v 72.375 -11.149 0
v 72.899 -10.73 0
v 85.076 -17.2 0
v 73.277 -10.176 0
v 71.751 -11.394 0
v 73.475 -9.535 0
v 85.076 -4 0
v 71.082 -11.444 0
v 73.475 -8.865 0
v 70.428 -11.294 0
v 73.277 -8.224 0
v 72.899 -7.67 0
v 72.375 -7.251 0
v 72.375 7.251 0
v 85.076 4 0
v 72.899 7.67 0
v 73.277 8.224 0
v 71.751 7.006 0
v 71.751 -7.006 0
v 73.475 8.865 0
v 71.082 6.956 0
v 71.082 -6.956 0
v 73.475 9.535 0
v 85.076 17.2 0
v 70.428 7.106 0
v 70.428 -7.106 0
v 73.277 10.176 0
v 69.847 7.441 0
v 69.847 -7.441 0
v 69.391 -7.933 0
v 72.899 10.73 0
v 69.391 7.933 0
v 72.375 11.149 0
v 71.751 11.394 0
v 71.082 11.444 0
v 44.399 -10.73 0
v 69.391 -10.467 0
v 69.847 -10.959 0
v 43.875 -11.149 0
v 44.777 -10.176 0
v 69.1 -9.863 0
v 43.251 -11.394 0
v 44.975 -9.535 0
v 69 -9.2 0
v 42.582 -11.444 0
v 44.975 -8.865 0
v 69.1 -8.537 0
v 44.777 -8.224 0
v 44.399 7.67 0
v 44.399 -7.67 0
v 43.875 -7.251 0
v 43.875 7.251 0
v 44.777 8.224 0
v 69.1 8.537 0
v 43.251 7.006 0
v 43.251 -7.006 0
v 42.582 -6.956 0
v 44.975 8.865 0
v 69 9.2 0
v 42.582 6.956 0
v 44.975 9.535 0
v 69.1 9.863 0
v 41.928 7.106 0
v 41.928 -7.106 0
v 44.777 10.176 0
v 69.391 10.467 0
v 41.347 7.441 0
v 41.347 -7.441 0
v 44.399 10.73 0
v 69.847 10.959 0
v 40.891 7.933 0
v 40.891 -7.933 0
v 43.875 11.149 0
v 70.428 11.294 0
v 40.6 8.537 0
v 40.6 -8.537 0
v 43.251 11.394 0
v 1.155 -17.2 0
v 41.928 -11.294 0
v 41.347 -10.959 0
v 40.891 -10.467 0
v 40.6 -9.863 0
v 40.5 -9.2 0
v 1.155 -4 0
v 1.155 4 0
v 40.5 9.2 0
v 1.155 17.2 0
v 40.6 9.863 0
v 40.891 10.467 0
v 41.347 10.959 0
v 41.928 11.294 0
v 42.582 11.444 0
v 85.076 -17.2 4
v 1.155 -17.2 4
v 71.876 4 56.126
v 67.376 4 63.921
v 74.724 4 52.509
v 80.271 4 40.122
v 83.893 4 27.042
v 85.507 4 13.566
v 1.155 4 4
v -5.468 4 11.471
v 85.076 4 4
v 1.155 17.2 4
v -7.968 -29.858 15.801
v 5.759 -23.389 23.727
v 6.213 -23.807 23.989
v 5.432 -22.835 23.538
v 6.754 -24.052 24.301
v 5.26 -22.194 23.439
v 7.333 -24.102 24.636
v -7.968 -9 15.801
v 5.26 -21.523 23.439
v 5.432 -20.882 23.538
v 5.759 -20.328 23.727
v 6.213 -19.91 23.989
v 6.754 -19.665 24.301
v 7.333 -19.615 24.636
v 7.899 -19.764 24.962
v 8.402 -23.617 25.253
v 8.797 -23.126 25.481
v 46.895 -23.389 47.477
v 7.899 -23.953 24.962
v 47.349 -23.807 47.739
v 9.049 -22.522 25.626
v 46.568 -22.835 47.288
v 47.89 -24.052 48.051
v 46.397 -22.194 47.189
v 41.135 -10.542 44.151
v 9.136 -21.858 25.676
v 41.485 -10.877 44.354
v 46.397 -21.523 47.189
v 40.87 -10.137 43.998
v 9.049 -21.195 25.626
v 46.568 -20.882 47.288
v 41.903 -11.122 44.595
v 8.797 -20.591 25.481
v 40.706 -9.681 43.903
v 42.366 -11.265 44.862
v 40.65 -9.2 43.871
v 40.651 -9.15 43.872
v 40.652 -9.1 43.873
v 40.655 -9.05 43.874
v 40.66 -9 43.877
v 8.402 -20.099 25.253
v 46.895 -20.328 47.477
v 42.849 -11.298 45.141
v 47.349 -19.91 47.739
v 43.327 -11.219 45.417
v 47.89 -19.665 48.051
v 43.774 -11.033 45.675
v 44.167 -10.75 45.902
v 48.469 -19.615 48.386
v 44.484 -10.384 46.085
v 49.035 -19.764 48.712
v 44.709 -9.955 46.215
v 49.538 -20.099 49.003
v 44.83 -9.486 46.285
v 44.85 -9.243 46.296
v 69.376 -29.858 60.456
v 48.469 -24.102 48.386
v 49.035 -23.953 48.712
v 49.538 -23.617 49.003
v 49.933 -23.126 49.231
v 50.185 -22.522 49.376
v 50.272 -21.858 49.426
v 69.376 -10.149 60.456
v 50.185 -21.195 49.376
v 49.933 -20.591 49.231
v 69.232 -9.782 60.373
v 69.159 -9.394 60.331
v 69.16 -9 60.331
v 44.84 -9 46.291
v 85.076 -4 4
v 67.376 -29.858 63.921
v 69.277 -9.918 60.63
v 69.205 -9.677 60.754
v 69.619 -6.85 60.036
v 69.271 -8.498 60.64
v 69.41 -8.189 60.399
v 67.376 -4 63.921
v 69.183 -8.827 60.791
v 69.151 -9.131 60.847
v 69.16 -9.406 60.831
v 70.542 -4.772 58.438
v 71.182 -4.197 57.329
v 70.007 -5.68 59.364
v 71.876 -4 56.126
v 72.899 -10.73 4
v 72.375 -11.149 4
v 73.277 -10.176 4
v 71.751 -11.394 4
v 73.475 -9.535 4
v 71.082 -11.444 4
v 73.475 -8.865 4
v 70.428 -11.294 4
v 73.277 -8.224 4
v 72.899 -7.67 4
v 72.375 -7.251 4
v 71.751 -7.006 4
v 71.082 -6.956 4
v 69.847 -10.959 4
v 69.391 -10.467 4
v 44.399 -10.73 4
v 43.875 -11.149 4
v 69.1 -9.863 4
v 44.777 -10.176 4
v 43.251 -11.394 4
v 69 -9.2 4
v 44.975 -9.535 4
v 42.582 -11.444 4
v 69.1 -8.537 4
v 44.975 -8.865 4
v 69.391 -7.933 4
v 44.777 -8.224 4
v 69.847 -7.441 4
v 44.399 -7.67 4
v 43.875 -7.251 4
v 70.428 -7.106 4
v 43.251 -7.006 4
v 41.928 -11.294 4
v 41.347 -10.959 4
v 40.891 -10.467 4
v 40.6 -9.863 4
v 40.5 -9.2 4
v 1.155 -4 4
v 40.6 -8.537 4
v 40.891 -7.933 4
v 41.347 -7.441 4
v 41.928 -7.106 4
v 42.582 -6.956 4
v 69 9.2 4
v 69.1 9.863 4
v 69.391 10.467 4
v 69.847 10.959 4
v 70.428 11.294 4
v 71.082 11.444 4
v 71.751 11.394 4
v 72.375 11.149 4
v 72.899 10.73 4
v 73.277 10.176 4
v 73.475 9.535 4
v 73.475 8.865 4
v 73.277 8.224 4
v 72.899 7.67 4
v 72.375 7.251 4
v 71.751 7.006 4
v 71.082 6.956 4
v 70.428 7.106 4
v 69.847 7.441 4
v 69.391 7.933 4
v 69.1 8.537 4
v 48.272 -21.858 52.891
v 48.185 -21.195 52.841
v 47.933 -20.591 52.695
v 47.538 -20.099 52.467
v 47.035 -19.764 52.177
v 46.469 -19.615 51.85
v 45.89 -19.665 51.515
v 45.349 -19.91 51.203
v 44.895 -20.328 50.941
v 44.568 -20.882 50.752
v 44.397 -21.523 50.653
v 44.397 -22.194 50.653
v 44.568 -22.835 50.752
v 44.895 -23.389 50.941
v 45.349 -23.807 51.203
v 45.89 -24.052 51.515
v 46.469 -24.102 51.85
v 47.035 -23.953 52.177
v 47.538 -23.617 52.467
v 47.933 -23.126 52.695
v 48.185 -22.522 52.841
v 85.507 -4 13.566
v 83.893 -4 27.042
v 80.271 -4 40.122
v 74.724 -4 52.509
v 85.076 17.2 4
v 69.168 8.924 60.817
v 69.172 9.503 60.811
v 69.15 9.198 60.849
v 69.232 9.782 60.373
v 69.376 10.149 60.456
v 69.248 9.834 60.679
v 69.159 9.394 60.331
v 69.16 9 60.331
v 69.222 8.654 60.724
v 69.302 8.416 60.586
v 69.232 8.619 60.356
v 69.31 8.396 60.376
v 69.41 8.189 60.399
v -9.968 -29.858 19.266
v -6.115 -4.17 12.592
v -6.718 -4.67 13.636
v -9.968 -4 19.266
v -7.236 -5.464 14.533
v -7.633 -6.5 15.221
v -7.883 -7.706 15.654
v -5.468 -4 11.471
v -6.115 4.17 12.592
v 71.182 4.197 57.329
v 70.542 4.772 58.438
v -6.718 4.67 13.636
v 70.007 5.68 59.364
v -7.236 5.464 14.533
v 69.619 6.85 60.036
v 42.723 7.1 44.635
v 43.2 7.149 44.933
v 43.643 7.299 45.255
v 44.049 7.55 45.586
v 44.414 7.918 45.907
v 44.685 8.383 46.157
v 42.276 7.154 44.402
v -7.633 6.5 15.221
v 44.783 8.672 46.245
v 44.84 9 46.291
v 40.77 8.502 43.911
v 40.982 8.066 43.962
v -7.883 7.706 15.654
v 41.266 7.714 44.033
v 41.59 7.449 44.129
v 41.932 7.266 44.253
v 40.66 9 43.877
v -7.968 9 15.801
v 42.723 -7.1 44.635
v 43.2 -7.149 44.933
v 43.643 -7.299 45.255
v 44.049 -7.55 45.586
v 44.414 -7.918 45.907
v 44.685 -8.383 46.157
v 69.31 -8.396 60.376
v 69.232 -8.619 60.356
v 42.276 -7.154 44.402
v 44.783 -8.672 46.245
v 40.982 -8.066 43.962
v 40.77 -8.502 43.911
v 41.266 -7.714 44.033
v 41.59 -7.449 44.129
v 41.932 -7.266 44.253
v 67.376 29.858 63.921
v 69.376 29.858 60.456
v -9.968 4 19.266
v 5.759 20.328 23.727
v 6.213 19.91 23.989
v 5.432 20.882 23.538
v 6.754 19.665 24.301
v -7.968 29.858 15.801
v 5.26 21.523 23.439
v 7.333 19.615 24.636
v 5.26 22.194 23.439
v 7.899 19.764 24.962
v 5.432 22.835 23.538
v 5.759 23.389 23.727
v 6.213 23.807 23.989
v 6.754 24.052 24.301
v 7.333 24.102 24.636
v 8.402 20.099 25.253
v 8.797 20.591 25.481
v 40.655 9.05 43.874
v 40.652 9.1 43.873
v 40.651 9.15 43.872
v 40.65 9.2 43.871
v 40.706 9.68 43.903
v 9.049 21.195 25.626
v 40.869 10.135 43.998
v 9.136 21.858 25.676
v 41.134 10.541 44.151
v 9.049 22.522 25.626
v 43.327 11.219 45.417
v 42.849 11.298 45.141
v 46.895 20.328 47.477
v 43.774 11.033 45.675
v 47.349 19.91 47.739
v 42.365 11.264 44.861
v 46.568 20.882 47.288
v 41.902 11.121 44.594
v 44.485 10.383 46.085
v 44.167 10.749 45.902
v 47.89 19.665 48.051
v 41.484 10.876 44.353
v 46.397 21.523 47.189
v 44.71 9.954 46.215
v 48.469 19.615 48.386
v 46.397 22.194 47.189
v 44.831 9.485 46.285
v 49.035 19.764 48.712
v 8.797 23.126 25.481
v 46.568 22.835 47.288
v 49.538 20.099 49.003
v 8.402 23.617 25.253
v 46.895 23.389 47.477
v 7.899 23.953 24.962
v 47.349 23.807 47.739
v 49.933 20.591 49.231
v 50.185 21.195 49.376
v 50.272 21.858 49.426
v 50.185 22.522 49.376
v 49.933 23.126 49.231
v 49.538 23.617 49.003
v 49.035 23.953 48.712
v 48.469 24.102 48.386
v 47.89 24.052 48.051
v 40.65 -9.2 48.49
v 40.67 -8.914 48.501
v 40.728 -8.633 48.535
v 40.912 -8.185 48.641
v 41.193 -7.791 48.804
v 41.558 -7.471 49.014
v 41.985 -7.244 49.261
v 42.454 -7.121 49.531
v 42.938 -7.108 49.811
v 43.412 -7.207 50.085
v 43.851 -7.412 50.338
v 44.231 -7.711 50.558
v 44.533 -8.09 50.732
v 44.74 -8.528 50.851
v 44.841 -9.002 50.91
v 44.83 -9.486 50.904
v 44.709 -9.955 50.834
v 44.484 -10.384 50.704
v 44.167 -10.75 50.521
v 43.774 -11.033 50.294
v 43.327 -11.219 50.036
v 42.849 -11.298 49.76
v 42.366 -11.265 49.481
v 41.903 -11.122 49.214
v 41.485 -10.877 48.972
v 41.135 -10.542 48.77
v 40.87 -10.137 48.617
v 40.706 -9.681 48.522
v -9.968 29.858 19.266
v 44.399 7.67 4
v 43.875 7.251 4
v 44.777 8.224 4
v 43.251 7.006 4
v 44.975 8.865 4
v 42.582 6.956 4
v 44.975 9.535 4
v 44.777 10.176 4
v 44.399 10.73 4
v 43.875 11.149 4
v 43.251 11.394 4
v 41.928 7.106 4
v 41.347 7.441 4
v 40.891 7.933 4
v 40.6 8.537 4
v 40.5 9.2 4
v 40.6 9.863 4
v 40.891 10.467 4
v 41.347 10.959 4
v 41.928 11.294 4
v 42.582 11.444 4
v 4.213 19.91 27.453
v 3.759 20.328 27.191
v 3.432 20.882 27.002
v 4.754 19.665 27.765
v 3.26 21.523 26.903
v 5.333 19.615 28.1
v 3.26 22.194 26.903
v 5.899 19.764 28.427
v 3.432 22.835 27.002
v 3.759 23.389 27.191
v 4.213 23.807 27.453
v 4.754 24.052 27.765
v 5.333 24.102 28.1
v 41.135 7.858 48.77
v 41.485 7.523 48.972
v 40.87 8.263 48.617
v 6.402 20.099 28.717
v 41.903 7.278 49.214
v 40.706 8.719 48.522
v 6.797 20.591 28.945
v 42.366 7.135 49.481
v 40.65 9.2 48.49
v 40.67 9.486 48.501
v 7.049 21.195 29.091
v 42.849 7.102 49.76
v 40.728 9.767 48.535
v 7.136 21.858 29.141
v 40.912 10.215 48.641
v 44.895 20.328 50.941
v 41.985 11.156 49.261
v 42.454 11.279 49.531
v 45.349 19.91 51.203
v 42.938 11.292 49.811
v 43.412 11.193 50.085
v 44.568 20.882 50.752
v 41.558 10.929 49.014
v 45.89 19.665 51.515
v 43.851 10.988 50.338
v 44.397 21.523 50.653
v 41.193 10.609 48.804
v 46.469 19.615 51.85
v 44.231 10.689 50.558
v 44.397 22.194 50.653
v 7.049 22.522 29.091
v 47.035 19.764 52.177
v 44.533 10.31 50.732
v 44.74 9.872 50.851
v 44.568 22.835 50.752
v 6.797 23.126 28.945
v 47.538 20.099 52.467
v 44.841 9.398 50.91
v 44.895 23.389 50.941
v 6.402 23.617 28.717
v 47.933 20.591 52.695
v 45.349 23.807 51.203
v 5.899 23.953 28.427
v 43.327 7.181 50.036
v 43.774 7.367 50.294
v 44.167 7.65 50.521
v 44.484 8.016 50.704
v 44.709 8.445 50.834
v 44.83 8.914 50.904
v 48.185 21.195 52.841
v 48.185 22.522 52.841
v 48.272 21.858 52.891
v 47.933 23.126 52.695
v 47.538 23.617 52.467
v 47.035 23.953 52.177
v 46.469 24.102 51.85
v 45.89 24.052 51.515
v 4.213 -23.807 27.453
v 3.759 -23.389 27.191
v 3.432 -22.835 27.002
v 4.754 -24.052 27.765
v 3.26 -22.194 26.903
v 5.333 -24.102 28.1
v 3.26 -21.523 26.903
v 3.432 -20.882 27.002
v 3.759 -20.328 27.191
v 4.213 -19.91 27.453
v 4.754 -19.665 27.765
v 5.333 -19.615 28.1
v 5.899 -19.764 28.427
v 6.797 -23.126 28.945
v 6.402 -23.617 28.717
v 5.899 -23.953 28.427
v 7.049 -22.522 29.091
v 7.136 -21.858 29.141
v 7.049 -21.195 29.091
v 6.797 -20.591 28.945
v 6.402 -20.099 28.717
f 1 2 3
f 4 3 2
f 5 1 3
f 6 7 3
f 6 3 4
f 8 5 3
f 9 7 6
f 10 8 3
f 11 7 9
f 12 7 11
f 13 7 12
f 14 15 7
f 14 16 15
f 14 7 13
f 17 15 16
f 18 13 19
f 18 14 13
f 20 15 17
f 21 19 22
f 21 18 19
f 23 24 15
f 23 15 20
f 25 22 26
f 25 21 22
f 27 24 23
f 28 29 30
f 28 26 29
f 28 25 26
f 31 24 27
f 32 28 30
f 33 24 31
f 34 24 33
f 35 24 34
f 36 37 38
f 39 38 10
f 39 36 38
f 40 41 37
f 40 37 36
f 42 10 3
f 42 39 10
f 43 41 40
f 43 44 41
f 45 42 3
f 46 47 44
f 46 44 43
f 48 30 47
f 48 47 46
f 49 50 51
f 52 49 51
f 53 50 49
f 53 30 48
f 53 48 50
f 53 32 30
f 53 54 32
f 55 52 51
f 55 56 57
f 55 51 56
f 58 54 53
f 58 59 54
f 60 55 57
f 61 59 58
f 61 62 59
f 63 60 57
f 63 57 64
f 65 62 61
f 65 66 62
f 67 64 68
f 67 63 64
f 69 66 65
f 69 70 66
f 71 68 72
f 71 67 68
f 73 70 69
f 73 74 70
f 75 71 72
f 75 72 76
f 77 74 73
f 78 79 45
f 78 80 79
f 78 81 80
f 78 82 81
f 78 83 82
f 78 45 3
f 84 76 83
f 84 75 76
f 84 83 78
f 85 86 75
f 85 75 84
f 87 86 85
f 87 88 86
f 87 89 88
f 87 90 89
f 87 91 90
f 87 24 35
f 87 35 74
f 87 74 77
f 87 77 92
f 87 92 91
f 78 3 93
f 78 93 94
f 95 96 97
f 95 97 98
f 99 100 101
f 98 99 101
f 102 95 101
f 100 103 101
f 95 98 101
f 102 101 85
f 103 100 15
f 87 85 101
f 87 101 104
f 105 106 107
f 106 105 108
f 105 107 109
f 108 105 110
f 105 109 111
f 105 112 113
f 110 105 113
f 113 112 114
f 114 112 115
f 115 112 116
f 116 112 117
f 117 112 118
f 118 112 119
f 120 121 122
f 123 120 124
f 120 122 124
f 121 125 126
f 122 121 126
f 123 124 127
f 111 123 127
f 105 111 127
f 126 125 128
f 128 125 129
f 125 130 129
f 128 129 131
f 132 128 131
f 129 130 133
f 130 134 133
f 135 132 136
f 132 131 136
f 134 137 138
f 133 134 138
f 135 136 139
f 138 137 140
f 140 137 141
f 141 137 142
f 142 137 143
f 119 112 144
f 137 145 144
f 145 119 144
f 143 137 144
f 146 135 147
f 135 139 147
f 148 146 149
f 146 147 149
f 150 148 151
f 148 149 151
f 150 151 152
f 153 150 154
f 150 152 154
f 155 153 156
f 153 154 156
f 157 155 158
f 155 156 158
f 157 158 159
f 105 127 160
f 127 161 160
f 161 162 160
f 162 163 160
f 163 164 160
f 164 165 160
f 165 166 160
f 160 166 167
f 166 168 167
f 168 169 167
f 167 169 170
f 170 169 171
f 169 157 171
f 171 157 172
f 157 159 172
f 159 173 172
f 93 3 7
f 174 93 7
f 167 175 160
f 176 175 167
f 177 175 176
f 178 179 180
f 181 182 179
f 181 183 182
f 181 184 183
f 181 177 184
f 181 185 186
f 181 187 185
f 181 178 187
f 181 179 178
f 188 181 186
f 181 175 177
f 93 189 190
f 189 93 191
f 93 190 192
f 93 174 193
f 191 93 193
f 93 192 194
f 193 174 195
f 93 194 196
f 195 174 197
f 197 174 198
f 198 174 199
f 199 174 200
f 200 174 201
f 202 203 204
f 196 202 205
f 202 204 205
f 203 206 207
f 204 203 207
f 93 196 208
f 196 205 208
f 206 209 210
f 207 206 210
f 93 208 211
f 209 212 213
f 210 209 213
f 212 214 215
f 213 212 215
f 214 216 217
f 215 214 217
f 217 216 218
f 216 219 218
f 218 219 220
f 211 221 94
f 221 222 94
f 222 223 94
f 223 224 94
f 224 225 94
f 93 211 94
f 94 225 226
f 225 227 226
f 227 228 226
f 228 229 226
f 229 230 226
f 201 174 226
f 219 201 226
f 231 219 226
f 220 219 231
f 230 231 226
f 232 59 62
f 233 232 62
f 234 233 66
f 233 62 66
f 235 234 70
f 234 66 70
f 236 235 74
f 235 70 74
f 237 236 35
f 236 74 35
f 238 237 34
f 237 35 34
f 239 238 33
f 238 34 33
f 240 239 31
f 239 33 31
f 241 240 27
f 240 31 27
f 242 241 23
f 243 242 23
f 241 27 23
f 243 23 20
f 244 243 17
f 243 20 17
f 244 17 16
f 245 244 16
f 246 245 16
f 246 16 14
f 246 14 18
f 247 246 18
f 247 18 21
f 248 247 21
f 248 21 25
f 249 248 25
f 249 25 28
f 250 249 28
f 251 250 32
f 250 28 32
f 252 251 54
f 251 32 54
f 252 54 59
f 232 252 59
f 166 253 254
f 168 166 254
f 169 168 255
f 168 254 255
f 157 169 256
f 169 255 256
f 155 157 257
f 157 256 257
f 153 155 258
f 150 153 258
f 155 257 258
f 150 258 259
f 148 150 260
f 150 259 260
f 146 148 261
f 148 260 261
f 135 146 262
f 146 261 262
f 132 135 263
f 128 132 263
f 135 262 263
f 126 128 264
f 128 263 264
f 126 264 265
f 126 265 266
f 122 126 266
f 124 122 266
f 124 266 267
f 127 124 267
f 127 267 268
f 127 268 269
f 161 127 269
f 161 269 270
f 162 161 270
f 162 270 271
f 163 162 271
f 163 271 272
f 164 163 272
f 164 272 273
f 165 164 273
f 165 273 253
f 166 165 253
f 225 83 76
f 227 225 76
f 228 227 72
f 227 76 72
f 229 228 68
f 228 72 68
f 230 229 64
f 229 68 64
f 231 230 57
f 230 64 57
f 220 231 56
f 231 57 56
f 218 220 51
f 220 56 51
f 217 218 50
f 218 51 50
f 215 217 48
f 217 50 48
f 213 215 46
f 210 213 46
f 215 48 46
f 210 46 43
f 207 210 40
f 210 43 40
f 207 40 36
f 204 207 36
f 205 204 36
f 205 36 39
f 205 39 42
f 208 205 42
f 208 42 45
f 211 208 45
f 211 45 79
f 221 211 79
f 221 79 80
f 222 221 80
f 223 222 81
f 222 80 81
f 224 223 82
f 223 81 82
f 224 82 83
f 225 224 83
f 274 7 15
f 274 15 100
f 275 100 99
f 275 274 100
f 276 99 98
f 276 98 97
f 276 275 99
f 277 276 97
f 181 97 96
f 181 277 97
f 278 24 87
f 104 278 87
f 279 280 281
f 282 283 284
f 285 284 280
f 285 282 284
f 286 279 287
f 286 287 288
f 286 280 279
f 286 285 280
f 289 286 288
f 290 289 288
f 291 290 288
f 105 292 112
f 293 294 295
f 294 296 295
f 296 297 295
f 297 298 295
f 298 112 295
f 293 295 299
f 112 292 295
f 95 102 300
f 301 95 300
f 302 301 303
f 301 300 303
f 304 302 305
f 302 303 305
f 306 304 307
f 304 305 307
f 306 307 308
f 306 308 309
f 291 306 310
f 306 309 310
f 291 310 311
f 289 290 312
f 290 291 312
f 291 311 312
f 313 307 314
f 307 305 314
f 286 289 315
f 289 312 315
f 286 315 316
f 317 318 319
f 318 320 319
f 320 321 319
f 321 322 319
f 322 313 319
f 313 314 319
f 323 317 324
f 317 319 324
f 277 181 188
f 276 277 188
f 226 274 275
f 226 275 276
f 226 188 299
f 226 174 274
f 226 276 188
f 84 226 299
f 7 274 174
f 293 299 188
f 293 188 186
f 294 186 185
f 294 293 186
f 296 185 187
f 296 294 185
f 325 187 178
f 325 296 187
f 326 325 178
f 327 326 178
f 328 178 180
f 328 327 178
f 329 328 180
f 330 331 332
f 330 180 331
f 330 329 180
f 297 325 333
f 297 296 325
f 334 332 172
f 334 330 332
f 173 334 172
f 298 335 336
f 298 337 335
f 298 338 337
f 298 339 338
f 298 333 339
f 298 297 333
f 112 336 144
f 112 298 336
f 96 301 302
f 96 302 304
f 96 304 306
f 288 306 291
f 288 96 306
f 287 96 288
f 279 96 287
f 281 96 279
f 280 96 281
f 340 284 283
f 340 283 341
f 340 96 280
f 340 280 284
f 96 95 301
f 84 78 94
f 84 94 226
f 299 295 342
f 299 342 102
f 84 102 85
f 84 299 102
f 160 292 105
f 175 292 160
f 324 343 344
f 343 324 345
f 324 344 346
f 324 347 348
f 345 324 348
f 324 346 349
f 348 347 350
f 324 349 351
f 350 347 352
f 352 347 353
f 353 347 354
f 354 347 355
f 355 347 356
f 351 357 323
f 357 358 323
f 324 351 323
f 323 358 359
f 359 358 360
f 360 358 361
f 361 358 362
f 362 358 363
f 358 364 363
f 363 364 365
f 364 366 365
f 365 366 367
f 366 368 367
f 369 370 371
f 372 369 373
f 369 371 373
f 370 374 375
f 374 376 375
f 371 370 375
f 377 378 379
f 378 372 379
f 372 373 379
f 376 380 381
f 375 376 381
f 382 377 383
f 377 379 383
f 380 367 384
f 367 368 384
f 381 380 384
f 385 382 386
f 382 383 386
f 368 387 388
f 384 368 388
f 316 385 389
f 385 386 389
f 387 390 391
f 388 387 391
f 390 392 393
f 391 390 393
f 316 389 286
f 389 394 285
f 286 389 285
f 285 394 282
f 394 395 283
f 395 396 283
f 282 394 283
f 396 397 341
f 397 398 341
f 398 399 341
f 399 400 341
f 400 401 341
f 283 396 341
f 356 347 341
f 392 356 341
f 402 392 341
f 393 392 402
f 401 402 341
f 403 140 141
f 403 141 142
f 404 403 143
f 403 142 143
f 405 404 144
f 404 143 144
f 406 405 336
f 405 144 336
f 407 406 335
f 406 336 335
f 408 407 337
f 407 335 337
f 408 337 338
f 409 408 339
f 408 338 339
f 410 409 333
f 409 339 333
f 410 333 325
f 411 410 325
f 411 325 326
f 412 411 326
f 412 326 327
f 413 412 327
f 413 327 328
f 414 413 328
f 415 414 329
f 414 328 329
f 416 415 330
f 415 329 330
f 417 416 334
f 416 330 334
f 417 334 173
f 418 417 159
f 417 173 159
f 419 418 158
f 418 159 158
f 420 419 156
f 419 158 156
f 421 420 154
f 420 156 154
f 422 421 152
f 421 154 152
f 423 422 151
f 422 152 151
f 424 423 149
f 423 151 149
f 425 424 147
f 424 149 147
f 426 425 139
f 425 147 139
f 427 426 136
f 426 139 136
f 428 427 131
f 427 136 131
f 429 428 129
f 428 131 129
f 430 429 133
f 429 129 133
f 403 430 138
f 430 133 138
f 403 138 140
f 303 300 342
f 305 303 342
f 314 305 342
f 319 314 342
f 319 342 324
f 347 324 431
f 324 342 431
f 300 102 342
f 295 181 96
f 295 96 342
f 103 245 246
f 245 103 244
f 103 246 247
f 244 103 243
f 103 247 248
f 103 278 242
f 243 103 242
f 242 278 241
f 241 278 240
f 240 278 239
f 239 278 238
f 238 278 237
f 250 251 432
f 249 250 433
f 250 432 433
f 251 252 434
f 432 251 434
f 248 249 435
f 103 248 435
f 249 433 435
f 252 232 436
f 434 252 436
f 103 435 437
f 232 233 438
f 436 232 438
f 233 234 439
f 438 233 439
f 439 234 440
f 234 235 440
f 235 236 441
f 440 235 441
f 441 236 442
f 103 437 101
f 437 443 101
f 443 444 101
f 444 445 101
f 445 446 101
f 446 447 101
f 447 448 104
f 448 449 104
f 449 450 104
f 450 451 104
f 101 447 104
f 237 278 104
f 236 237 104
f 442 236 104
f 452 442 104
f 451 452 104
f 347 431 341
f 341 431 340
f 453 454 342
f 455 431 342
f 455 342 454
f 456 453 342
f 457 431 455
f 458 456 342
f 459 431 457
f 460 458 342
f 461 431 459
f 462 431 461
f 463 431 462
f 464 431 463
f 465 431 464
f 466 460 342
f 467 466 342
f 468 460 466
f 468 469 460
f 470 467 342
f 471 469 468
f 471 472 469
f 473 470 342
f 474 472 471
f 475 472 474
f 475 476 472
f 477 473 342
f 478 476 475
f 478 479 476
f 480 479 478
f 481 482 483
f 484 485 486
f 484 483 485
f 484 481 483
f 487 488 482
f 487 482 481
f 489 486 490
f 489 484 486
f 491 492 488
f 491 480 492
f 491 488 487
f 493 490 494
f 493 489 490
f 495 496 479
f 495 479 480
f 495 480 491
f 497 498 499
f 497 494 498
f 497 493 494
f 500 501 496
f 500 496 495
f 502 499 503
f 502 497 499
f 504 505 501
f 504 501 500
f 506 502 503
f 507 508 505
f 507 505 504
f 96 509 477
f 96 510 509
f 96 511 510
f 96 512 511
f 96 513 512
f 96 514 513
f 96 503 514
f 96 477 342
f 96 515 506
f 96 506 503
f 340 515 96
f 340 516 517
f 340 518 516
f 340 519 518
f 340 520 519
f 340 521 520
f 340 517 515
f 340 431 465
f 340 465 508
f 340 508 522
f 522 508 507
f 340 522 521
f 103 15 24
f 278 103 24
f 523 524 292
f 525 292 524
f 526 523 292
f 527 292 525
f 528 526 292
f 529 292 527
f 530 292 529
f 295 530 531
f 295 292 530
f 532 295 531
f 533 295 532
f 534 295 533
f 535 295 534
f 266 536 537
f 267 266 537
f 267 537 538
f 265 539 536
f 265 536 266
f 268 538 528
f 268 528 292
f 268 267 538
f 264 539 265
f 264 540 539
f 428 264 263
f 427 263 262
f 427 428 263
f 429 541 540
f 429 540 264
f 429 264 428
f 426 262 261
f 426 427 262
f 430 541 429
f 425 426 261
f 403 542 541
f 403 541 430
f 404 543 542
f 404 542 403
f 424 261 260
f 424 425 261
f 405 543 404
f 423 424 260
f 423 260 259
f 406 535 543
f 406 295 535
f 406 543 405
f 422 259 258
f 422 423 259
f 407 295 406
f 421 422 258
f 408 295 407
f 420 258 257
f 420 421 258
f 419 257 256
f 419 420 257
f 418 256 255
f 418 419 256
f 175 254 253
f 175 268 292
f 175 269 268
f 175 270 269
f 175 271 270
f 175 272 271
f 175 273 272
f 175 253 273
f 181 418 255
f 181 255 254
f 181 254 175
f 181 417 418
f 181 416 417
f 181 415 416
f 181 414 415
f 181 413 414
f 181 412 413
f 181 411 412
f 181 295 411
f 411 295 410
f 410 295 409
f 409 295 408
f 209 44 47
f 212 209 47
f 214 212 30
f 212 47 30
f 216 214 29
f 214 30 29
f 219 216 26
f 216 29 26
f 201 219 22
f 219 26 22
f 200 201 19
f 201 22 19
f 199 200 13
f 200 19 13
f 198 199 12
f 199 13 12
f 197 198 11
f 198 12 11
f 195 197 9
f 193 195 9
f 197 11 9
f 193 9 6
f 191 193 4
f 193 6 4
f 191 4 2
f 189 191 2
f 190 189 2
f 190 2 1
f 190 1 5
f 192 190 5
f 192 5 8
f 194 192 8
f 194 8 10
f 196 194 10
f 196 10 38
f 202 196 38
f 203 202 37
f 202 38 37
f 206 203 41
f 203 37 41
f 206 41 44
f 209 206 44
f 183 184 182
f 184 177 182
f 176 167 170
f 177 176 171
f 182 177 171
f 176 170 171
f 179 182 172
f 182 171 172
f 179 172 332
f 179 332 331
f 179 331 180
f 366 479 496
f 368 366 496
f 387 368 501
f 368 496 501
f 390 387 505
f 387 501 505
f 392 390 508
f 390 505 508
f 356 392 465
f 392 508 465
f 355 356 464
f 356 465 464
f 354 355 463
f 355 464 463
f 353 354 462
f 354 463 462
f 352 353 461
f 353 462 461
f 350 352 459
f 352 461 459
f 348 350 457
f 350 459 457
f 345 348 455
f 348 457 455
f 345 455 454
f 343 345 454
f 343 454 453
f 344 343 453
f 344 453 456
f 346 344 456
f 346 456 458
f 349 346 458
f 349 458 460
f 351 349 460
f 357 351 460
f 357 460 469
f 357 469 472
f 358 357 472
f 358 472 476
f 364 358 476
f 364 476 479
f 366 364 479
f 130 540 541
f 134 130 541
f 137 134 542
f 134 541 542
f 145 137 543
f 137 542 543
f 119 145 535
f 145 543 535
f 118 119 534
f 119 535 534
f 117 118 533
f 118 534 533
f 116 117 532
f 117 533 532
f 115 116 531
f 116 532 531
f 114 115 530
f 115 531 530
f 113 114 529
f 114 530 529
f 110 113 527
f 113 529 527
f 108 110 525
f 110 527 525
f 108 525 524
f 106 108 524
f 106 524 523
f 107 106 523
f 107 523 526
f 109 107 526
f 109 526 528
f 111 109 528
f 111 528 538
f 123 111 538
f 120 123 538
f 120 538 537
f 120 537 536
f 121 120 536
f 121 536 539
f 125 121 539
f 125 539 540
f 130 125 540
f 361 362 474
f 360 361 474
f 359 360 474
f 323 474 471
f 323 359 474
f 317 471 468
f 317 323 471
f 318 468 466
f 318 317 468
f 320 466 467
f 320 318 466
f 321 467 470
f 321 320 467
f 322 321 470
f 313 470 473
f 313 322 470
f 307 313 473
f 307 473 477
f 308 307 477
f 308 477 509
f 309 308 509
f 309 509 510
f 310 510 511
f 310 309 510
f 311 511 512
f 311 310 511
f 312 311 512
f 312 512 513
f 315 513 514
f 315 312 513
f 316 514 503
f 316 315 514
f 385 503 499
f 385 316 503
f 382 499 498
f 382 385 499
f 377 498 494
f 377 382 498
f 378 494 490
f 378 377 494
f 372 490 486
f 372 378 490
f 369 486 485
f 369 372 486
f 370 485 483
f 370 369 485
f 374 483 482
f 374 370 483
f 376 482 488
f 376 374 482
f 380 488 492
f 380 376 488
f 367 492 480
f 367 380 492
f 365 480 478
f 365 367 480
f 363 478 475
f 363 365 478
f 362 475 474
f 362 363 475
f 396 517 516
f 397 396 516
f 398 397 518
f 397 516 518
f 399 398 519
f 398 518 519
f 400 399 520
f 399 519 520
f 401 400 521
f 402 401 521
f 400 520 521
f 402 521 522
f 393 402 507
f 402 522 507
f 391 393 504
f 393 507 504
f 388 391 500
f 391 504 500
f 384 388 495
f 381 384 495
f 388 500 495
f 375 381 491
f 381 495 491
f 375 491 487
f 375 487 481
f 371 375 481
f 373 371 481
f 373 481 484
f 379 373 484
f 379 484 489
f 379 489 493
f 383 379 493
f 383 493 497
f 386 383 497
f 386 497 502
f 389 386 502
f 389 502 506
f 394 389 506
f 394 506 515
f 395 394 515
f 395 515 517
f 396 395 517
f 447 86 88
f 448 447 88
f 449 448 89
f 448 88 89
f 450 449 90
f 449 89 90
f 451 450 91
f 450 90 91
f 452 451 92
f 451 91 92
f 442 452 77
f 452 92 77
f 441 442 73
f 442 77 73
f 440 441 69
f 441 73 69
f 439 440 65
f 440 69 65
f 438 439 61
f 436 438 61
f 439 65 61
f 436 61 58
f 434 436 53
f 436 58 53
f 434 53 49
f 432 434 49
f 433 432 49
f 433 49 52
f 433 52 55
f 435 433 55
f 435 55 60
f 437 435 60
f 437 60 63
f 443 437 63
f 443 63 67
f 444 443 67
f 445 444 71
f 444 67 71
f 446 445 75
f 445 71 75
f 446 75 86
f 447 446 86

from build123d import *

# Parameters (mm, degrees)
BOSS_EXTRUDE1_DEPTH      = 4
BOSS_EXTRUDE1_DEPTH_BACK = 4
SKETCH3_W                = 89.310018428
SKETCH3_H                = 59.716622104
BOSS_EXTRUDE2_DEPTH      = 4
CUT_EXTRUDE1_REACH       = 112.584
SKETCH4_R                = 2.25
SKETCH5_W                = 83.9215243
SKETCH5_H                = 34.4
BOSS_EXTRUDE3_DEPTH      = 4
SKETCH6_R                = 2.25
CUT_EXTRUDE2_DEPTH       = 4
FILLET1_R                = 5
SKETCH7_R                = 2.1
CUT_EXTRUDE3_DEPTH       = 109.665502377


with BuildPart() as part:
    # Sketch2 → Boss-Extrude1 (new, two sides: drawn at the far end of the back side and taken through both)
    with BuildSketch(Plane(origin=(0, 0, 0), x_dir=(1, 0, 0), z_dir=(0, 1, 0)).offset(-BOSS_EXTRUDE1_DEPTH_BACK)):
        with BuildLine():
            Line((1.154700538, 0), (85.076224838, 0))
            ThreePointArc((85.076224838, 0), (82.329376533, -33.6502282), (67.376468713, -63.920569811))
            Line((67.376468713, -63.920569811), (-9.968276059, -19.265560597))
            Line((-9.968276059, -19.265560597), (1.154700538, 0))
        make_face()
    extrude(amount=BOSS_EXTRUDE1_DEPTH + BOSS_EXTRUDE1_DEPTH_BACK)

    # Sketch3 → Boss-Extrude2 (add)
    with BuildSketch(Plane(origin=(-10.834301462, 0, 18.765560597), x_dir=(0.8660254037844386, 0, 0.5000000000000001), z_dir=(-0.5000000000000001, 0, 0.8660254037844386))):
        with Locations((45.655009214, 0)):
            Rectangle(SKETCH3_W, SKETCH3_H)
    extrude(amount=-BOSS_EXTRUDE2_DEPTH)

    # Sketch4 → Cut-Extrude1 (cut, up to next)
    with BuildSketch(Plane(origin=(-10.834301462, 0, 18.765560597), x_dir=(0.8660254037844386, 0, 0.5000000000000001), z_dir=(-0.5000000000000001, 0, 0.8660254037844386)), mode=Mode.PRIVATE) as cut_extrude1_sk1:
        with Locations((66, 21.858311052)):
            Circle(SKETCH4_R)
    cut_extrude1_tool1 = extrude(cut_extrude1_sk1.sketch, amount=-CUT_EXTRUDE1_REACH, mode=Mode.PRIVATE) & part.part
    # Sketch4 → Cut-Extrude1 (cut, up to next)
    with BuildSketch(Plane(origin=(-10.834301462, 0, 18.765560597), x_dir=(0.8660254037844386, 0, 0.5000000000000001), z_dir=(-0.5000000000000001, 0, 0.8660254037844386)), mode=Mode.PRIVATE) as cut_extrude1_sk2:
        with Locations((66, -21.858311052)):
            Circle(SKETCH4_R)
    cut_extrude1_tool2 = extrude(cut_extrude1_sk2.sketch, amount=-CUT_EXTRUDE1_REACH, mode=Mode.PRIVATE) & part.part
    # Sketch4 → Cut-Extrude1 (cut, up to next)
    with BuildSketch(Plane(origin=(-10.834301462, 0, 18.765560597), x_dir=(0.8660254037844386, 0, 0.5000000000000001), z_dir=(-0.5000000000000001, 0, 0.8660254037844386)), mode=Mode.PRIVATE) as cut_extrude1_sk3:
        with Locations((18.5, 21.858311052)):
            Circle(SKETCH4_R)
    cut_extrude1_tool3 = extrude(cut_extrude1_sk3.sketch, amount=-CUT_EXTRUDE1_REACH, mode=Mode.PRIVATE) & part.part
    # Sketch4 → Cut-Extrude1 (cut, up to next)
    with BuildSketch(Plane(origin=(-10.834301462, 0, 18.765560597), x_dir=(0.8660254037844386, 0, 0.5000000000000001), z_dir=(-0.5000000000000001, 0, 0.8660254037844386)), mode=Mode.PRIVATE) as cut_extrude1_sk4:
        with Locations((18.5, -21.858311052)):
            Circle(SKETCH4_R)
    cut_extrude1_tool4 = extrude(cut_extrude1_sk4.sketch, amount=-CUT_EXTRUDE1_REACH, mode=Mode.PRIVATE) & part.part
    add(cut_extrude1_tool1.solids().sort_by_distance((46.323375, 21.858311, 51.765561))[0], mode=Mode.SUBTRACT)
    add(cut_extrude1_tool2.solids().sort_by_distance((46.323375, -21.858311, 51.765561))[0], mode=Mode.SUBTRACT)
    add(cut_extrude1_tool3.solids().sort_by_distance((5.187169, 21.858311, 28.015561))[0], mode=Mode.SUBTRACT)
    add(cut_extrude1_tool4.solids().sort_by_distance((5.187169, -21.858311, 28.015561))[0], mode=Mode.SUBTRACT)

    # Sketch5 → Boss-Extrude3 (add)
    with BuildSketch(Plane(origin=(0, 0, 0), x_dir=(-1, 0, 0), z_dir=(0, 0, -1))):
        with Locations((-43.115462688, 0)):
            Rectangle(SKETCH5_W, SKETCH5_H)
    extrude(amount=-BOSS_EXTRUDE3_DEPTH)

    # Sketch6 → Cut-Extrude2 (cut)
    with BuildSketch(Plane(origin=(0, 0, 0), x_dir=(-1, 0, 0), z_dir=(0, 0, -1))):
        with Locations((-71.25, -9.2)):
            Circle(SKETCH6_R)
        with Locations((-71.25, 9.2)):
            Circle(SKETCH6_R)
        with Locations((-42.75, 9.2)):
            Circle(SKETCH6_R)
        with Locations((-42.75, -9.2)):
            Circle(SKETCH6_R)
    extrude(amount=-CUT_EXTRUDE2_DEPTH, mode=Mode.SUBTRACT)

    # Fillet1
    fillet1_edges = [part.edges().sort_by_distance(p)[0] for p in [
        (30.704096327, -4, 38.128963589),
        (30.704096327, 4, 38.128963589),
    ]]
    fillet(fillet1_edges, radius=FILLET1_R)

    # Sketch7 → Cut-Extrude3 (cut, through all)
    with BuildSketch(Plane.XY.offset(4)):
        with Locations((42.75, 9.2)):
            Circle(SKETCH7_R)
        with Locations((71.25, 9.2)):
            Circle(SKETCH7_R)
    cut_extrude3 = extrude(amount=CUT_EXTRUDE3_DEPTH, mode=Mode.SUBTRACT)

    # Mirror1: Cut-Extrude3 across plane
    add(cut_extrude3.mirror(Plane.ZX), mode=Mode.SUBTRACT)


solid = part.part
